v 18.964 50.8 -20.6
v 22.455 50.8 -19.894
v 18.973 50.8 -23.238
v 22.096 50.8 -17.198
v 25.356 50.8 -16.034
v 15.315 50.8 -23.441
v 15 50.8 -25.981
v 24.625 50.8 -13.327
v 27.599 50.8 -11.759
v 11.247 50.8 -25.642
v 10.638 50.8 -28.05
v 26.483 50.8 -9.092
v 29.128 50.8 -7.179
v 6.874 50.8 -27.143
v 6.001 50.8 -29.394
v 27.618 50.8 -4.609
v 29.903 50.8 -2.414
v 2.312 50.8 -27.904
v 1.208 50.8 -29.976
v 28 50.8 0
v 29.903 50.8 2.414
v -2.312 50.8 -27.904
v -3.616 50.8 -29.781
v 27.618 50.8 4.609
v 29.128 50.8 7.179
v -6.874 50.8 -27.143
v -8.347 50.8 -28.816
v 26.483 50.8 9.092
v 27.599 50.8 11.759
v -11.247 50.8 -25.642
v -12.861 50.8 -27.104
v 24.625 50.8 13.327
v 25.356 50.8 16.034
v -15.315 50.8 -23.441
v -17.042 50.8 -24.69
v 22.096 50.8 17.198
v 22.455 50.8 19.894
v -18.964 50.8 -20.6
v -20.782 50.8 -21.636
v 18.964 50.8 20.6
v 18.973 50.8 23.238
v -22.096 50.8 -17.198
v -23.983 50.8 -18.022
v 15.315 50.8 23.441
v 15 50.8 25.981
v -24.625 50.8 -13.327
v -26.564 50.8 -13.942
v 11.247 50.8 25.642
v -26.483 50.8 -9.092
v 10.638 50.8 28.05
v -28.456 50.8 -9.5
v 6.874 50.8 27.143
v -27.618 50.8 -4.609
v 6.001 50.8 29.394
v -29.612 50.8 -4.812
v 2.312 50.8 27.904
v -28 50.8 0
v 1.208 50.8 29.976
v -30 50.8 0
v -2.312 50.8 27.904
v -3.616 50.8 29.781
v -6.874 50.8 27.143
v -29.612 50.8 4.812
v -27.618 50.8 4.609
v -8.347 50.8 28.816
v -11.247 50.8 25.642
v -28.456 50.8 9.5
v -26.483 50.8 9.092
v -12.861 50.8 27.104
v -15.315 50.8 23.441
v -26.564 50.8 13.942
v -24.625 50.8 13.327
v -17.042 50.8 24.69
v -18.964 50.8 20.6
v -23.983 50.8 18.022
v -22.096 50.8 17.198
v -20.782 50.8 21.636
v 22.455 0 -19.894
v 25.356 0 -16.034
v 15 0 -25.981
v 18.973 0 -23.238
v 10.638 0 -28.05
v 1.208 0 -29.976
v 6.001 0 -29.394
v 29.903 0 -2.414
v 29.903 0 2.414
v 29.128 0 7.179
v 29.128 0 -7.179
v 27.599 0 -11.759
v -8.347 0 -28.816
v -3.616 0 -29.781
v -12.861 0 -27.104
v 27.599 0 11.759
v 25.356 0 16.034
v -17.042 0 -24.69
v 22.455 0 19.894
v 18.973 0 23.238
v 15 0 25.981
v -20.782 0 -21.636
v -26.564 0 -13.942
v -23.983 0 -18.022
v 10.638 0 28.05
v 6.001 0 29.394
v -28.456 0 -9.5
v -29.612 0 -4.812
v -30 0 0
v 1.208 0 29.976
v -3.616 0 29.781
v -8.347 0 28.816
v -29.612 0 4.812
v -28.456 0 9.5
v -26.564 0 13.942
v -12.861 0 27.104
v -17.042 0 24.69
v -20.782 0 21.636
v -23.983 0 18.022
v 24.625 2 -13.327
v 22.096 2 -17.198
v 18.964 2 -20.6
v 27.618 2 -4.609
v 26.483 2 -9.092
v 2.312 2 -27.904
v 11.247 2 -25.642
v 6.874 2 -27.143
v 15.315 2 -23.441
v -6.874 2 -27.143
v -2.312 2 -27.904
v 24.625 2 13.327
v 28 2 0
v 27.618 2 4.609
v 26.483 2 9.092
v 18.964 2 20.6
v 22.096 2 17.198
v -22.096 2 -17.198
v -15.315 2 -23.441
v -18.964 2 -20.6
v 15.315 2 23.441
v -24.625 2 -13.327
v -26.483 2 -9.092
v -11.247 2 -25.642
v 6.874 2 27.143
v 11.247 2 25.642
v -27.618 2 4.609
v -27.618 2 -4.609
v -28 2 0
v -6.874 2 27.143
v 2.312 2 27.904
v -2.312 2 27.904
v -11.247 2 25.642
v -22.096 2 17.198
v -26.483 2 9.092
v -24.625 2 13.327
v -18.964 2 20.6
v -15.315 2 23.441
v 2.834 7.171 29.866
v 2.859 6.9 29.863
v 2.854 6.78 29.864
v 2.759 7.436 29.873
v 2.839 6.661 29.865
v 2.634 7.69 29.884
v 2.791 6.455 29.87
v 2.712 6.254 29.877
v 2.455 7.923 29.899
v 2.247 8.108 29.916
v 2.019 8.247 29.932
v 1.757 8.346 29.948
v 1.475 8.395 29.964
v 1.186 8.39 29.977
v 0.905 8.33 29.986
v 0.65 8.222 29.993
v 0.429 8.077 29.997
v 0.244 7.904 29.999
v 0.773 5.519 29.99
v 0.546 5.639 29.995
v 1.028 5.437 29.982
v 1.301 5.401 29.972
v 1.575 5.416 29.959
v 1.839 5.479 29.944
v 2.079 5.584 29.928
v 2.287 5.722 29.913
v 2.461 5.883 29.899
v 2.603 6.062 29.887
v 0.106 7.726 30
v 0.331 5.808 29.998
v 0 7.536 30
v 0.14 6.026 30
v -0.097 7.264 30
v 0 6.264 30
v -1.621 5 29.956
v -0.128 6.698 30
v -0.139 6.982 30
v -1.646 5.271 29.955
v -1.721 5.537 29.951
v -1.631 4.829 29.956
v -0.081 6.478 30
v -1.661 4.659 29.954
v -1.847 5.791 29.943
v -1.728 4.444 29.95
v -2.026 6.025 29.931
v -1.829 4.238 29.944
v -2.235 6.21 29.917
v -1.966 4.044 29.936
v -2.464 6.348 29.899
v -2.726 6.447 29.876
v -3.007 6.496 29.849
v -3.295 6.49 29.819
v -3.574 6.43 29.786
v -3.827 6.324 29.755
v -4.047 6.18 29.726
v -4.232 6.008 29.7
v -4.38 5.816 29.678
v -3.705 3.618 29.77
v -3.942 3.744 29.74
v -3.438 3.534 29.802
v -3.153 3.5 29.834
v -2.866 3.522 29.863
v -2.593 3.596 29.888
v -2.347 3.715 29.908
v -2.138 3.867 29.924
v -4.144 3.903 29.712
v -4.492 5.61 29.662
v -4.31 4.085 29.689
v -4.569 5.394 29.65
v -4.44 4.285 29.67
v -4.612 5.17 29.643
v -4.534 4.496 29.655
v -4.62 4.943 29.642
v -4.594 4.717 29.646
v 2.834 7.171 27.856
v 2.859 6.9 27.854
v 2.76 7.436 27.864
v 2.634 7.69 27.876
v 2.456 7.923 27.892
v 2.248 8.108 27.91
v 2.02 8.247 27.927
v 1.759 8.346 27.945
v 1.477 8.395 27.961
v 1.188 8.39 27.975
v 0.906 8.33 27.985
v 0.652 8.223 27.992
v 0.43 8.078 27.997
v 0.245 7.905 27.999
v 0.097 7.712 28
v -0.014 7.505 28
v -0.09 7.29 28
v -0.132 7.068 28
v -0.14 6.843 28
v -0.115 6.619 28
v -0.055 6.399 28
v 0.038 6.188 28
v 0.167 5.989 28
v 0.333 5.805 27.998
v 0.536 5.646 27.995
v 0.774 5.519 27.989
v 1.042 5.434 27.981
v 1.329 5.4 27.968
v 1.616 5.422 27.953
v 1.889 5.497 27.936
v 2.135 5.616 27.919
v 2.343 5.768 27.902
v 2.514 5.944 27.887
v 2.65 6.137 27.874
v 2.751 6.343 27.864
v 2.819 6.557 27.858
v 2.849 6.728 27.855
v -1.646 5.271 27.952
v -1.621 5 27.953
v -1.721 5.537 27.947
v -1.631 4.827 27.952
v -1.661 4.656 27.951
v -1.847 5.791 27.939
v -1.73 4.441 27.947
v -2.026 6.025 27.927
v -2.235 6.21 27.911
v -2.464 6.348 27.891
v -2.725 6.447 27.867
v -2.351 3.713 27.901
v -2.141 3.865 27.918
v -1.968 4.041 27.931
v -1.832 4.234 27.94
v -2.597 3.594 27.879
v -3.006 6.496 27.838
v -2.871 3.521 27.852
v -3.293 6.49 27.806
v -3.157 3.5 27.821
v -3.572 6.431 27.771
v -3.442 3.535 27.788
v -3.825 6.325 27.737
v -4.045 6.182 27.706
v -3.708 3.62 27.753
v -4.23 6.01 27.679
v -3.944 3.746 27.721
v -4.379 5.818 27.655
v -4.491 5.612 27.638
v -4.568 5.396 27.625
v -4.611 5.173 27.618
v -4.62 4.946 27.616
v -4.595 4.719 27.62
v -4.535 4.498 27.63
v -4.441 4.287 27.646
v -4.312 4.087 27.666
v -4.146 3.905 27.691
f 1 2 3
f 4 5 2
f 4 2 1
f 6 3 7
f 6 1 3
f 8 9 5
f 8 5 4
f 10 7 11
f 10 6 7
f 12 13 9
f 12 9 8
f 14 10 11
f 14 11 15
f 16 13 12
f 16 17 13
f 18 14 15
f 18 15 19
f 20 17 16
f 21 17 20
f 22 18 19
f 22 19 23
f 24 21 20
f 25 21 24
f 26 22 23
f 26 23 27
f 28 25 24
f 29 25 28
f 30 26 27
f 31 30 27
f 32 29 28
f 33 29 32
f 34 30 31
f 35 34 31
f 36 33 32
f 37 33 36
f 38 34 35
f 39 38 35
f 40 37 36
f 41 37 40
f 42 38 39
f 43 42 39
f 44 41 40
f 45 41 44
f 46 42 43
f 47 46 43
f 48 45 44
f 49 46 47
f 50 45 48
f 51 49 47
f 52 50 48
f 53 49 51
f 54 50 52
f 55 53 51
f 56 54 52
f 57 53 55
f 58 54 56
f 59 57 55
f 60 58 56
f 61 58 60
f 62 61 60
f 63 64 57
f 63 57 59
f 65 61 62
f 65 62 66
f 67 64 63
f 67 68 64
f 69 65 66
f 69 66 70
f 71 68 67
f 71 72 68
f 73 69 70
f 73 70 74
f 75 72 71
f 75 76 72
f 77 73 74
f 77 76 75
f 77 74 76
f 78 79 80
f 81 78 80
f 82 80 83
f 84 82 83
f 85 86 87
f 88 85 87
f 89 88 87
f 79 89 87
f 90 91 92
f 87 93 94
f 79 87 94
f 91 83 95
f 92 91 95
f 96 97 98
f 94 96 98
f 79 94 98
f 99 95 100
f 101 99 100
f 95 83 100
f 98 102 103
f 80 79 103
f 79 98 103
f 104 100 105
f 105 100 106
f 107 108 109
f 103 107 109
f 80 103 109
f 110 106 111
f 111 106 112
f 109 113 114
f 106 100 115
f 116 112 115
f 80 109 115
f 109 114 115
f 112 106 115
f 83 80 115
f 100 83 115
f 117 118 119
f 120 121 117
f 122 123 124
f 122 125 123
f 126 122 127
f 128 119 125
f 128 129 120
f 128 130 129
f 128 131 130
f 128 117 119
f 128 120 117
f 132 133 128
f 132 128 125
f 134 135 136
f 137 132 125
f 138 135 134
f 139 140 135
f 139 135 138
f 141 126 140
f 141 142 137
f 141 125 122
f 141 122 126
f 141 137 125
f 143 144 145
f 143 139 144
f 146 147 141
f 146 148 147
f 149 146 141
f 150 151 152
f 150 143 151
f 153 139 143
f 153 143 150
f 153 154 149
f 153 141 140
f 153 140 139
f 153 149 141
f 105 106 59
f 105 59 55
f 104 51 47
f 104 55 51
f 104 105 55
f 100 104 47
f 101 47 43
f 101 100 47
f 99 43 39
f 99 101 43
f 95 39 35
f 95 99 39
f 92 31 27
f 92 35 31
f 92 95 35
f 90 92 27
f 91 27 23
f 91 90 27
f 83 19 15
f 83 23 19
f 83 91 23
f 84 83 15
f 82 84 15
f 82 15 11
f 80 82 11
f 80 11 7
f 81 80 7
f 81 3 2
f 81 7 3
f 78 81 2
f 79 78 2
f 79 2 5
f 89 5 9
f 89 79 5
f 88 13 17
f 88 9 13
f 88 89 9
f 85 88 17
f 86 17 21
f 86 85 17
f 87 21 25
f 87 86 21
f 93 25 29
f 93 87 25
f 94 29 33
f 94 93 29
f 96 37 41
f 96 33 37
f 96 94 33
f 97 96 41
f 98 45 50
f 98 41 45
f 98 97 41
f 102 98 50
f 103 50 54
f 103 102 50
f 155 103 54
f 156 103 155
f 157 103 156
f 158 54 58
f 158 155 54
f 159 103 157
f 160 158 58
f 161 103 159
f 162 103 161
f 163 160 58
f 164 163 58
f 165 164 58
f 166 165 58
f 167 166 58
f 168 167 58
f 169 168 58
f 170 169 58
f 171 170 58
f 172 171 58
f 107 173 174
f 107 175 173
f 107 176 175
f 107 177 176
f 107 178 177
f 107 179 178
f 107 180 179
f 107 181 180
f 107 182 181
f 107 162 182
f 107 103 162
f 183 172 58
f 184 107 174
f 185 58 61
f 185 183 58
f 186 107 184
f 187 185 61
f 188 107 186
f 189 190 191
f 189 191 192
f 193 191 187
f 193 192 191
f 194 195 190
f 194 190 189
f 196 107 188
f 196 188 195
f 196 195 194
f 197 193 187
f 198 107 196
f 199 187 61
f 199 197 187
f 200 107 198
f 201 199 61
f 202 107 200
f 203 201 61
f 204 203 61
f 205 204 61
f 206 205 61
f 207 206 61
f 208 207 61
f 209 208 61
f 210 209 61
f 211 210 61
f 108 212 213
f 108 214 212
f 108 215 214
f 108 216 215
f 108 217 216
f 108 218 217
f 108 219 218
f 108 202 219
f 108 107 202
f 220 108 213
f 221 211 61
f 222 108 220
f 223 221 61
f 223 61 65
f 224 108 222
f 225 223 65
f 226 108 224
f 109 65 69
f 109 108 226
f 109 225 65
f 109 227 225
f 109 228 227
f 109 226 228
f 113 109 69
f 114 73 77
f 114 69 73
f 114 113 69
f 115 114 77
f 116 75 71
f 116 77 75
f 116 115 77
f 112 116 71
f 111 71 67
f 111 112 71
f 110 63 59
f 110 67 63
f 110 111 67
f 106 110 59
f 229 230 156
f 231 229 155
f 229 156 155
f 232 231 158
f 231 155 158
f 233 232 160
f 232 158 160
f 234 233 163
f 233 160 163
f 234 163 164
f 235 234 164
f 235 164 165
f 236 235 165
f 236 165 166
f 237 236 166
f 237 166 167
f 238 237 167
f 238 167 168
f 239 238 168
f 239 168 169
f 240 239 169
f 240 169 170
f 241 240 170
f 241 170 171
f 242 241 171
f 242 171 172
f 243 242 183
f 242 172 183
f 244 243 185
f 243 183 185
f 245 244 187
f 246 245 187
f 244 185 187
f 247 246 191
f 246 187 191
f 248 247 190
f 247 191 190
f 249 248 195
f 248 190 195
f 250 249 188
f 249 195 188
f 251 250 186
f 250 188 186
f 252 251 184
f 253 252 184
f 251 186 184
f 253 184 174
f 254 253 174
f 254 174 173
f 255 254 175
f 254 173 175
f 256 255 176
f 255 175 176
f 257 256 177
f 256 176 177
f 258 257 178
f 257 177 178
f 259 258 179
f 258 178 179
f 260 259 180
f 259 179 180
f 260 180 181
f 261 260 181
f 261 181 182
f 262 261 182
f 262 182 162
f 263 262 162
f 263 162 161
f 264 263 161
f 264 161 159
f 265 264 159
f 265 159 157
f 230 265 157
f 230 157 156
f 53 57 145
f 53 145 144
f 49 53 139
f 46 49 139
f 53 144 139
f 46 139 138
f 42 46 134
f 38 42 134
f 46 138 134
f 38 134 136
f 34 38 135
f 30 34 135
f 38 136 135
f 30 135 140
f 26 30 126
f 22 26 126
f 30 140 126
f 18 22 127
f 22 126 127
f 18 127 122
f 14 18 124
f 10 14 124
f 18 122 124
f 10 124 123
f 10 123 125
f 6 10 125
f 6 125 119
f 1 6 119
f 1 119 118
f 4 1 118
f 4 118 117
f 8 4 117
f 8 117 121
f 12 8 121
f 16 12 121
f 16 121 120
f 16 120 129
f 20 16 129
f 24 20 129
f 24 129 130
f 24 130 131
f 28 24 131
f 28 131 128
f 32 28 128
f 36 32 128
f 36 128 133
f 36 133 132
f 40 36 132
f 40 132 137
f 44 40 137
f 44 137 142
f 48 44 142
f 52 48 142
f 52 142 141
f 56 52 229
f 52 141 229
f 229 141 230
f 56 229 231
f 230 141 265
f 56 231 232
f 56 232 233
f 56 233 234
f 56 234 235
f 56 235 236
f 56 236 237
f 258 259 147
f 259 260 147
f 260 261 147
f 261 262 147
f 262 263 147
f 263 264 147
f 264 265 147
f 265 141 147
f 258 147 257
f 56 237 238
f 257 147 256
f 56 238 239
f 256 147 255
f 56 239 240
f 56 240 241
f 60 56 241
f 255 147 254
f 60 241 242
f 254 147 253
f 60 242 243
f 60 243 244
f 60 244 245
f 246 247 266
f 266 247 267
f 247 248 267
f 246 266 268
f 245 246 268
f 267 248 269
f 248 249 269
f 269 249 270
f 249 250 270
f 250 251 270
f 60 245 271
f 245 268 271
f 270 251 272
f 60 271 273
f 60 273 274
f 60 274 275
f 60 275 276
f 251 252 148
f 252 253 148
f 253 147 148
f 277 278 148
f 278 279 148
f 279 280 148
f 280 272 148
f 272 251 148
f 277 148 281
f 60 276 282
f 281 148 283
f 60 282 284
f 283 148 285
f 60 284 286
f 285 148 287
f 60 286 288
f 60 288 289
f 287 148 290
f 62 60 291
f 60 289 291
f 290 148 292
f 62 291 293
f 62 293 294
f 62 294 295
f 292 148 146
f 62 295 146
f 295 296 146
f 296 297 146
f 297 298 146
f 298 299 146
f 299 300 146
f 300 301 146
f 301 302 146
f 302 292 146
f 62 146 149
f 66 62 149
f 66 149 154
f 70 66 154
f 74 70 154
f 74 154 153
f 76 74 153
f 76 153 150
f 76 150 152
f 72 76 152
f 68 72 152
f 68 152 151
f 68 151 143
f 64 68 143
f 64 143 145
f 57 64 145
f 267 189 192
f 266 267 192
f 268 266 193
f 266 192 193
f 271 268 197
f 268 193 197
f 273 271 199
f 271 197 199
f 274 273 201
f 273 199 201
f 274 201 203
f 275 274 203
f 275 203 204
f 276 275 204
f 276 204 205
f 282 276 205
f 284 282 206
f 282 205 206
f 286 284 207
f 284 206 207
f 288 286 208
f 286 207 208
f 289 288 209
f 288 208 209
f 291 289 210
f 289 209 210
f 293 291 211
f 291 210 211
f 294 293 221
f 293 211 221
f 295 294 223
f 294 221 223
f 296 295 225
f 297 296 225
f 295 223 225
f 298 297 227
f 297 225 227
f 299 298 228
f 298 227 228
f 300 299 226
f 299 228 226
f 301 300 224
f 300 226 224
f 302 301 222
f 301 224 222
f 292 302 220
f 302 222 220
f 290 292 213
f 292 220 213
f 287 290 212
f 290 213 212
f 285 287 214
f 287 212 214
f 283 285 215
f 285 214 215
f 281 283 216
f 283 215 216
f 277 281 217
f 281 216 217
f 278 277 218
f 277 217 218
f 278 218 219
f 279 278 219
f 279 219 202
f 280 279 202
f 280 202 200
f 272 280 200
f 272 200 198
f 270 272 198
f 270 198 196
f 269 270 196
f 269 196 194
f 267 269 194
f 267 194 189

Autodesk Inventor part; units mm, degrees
ref_plane "YZ Plane" through (0, 0, 0) normal (1, 0, 0) x (0, 1, 0)
ref_plane "XZ Plane" through (0, 0, 0) normal (0, 1, 0) x (-1, 0, 0)
sketch "Sketch1" plane through (0, 0, 0) normal (0, 1, 0) x (-1, 0, 0)
  circle A0 centre (0, 0) radius 30
  dimension "d0" = 60
extrude "Extrusion1" add sketch "Sketch1" along normal blind 50.8
shell "Shell1" thickness 2 removed faces 1 at (-9.4188, 50.8, 0)
ref_plane "Work Plane1" through (0, 0, 30) normal (0, 0, 1) x (1, 0, 0)
sketch "Sketch2" plane through (0, 0, 30) normal (0, 0, 1) x (1, 0, 0)
  line L0 (28, 2) -> (-28, 2) projected
  circle A0 centre (-3.1214, 5) radius 1.5
  circle A1 centre (1.3586, 6.9) radius 1.5
  point P0 (0, 0)
  dimension "d4" = 3
  dimension "d5" = 3
  dimension "d6" = 4.48
  dimension "d7" = 1.9
  dimension "d8" = 3
extrude "Extrusion2" cut sketch "Sketch2" against normal blind 4
properties part number "Simple Pressure Gauge Cup 23-02-03"
